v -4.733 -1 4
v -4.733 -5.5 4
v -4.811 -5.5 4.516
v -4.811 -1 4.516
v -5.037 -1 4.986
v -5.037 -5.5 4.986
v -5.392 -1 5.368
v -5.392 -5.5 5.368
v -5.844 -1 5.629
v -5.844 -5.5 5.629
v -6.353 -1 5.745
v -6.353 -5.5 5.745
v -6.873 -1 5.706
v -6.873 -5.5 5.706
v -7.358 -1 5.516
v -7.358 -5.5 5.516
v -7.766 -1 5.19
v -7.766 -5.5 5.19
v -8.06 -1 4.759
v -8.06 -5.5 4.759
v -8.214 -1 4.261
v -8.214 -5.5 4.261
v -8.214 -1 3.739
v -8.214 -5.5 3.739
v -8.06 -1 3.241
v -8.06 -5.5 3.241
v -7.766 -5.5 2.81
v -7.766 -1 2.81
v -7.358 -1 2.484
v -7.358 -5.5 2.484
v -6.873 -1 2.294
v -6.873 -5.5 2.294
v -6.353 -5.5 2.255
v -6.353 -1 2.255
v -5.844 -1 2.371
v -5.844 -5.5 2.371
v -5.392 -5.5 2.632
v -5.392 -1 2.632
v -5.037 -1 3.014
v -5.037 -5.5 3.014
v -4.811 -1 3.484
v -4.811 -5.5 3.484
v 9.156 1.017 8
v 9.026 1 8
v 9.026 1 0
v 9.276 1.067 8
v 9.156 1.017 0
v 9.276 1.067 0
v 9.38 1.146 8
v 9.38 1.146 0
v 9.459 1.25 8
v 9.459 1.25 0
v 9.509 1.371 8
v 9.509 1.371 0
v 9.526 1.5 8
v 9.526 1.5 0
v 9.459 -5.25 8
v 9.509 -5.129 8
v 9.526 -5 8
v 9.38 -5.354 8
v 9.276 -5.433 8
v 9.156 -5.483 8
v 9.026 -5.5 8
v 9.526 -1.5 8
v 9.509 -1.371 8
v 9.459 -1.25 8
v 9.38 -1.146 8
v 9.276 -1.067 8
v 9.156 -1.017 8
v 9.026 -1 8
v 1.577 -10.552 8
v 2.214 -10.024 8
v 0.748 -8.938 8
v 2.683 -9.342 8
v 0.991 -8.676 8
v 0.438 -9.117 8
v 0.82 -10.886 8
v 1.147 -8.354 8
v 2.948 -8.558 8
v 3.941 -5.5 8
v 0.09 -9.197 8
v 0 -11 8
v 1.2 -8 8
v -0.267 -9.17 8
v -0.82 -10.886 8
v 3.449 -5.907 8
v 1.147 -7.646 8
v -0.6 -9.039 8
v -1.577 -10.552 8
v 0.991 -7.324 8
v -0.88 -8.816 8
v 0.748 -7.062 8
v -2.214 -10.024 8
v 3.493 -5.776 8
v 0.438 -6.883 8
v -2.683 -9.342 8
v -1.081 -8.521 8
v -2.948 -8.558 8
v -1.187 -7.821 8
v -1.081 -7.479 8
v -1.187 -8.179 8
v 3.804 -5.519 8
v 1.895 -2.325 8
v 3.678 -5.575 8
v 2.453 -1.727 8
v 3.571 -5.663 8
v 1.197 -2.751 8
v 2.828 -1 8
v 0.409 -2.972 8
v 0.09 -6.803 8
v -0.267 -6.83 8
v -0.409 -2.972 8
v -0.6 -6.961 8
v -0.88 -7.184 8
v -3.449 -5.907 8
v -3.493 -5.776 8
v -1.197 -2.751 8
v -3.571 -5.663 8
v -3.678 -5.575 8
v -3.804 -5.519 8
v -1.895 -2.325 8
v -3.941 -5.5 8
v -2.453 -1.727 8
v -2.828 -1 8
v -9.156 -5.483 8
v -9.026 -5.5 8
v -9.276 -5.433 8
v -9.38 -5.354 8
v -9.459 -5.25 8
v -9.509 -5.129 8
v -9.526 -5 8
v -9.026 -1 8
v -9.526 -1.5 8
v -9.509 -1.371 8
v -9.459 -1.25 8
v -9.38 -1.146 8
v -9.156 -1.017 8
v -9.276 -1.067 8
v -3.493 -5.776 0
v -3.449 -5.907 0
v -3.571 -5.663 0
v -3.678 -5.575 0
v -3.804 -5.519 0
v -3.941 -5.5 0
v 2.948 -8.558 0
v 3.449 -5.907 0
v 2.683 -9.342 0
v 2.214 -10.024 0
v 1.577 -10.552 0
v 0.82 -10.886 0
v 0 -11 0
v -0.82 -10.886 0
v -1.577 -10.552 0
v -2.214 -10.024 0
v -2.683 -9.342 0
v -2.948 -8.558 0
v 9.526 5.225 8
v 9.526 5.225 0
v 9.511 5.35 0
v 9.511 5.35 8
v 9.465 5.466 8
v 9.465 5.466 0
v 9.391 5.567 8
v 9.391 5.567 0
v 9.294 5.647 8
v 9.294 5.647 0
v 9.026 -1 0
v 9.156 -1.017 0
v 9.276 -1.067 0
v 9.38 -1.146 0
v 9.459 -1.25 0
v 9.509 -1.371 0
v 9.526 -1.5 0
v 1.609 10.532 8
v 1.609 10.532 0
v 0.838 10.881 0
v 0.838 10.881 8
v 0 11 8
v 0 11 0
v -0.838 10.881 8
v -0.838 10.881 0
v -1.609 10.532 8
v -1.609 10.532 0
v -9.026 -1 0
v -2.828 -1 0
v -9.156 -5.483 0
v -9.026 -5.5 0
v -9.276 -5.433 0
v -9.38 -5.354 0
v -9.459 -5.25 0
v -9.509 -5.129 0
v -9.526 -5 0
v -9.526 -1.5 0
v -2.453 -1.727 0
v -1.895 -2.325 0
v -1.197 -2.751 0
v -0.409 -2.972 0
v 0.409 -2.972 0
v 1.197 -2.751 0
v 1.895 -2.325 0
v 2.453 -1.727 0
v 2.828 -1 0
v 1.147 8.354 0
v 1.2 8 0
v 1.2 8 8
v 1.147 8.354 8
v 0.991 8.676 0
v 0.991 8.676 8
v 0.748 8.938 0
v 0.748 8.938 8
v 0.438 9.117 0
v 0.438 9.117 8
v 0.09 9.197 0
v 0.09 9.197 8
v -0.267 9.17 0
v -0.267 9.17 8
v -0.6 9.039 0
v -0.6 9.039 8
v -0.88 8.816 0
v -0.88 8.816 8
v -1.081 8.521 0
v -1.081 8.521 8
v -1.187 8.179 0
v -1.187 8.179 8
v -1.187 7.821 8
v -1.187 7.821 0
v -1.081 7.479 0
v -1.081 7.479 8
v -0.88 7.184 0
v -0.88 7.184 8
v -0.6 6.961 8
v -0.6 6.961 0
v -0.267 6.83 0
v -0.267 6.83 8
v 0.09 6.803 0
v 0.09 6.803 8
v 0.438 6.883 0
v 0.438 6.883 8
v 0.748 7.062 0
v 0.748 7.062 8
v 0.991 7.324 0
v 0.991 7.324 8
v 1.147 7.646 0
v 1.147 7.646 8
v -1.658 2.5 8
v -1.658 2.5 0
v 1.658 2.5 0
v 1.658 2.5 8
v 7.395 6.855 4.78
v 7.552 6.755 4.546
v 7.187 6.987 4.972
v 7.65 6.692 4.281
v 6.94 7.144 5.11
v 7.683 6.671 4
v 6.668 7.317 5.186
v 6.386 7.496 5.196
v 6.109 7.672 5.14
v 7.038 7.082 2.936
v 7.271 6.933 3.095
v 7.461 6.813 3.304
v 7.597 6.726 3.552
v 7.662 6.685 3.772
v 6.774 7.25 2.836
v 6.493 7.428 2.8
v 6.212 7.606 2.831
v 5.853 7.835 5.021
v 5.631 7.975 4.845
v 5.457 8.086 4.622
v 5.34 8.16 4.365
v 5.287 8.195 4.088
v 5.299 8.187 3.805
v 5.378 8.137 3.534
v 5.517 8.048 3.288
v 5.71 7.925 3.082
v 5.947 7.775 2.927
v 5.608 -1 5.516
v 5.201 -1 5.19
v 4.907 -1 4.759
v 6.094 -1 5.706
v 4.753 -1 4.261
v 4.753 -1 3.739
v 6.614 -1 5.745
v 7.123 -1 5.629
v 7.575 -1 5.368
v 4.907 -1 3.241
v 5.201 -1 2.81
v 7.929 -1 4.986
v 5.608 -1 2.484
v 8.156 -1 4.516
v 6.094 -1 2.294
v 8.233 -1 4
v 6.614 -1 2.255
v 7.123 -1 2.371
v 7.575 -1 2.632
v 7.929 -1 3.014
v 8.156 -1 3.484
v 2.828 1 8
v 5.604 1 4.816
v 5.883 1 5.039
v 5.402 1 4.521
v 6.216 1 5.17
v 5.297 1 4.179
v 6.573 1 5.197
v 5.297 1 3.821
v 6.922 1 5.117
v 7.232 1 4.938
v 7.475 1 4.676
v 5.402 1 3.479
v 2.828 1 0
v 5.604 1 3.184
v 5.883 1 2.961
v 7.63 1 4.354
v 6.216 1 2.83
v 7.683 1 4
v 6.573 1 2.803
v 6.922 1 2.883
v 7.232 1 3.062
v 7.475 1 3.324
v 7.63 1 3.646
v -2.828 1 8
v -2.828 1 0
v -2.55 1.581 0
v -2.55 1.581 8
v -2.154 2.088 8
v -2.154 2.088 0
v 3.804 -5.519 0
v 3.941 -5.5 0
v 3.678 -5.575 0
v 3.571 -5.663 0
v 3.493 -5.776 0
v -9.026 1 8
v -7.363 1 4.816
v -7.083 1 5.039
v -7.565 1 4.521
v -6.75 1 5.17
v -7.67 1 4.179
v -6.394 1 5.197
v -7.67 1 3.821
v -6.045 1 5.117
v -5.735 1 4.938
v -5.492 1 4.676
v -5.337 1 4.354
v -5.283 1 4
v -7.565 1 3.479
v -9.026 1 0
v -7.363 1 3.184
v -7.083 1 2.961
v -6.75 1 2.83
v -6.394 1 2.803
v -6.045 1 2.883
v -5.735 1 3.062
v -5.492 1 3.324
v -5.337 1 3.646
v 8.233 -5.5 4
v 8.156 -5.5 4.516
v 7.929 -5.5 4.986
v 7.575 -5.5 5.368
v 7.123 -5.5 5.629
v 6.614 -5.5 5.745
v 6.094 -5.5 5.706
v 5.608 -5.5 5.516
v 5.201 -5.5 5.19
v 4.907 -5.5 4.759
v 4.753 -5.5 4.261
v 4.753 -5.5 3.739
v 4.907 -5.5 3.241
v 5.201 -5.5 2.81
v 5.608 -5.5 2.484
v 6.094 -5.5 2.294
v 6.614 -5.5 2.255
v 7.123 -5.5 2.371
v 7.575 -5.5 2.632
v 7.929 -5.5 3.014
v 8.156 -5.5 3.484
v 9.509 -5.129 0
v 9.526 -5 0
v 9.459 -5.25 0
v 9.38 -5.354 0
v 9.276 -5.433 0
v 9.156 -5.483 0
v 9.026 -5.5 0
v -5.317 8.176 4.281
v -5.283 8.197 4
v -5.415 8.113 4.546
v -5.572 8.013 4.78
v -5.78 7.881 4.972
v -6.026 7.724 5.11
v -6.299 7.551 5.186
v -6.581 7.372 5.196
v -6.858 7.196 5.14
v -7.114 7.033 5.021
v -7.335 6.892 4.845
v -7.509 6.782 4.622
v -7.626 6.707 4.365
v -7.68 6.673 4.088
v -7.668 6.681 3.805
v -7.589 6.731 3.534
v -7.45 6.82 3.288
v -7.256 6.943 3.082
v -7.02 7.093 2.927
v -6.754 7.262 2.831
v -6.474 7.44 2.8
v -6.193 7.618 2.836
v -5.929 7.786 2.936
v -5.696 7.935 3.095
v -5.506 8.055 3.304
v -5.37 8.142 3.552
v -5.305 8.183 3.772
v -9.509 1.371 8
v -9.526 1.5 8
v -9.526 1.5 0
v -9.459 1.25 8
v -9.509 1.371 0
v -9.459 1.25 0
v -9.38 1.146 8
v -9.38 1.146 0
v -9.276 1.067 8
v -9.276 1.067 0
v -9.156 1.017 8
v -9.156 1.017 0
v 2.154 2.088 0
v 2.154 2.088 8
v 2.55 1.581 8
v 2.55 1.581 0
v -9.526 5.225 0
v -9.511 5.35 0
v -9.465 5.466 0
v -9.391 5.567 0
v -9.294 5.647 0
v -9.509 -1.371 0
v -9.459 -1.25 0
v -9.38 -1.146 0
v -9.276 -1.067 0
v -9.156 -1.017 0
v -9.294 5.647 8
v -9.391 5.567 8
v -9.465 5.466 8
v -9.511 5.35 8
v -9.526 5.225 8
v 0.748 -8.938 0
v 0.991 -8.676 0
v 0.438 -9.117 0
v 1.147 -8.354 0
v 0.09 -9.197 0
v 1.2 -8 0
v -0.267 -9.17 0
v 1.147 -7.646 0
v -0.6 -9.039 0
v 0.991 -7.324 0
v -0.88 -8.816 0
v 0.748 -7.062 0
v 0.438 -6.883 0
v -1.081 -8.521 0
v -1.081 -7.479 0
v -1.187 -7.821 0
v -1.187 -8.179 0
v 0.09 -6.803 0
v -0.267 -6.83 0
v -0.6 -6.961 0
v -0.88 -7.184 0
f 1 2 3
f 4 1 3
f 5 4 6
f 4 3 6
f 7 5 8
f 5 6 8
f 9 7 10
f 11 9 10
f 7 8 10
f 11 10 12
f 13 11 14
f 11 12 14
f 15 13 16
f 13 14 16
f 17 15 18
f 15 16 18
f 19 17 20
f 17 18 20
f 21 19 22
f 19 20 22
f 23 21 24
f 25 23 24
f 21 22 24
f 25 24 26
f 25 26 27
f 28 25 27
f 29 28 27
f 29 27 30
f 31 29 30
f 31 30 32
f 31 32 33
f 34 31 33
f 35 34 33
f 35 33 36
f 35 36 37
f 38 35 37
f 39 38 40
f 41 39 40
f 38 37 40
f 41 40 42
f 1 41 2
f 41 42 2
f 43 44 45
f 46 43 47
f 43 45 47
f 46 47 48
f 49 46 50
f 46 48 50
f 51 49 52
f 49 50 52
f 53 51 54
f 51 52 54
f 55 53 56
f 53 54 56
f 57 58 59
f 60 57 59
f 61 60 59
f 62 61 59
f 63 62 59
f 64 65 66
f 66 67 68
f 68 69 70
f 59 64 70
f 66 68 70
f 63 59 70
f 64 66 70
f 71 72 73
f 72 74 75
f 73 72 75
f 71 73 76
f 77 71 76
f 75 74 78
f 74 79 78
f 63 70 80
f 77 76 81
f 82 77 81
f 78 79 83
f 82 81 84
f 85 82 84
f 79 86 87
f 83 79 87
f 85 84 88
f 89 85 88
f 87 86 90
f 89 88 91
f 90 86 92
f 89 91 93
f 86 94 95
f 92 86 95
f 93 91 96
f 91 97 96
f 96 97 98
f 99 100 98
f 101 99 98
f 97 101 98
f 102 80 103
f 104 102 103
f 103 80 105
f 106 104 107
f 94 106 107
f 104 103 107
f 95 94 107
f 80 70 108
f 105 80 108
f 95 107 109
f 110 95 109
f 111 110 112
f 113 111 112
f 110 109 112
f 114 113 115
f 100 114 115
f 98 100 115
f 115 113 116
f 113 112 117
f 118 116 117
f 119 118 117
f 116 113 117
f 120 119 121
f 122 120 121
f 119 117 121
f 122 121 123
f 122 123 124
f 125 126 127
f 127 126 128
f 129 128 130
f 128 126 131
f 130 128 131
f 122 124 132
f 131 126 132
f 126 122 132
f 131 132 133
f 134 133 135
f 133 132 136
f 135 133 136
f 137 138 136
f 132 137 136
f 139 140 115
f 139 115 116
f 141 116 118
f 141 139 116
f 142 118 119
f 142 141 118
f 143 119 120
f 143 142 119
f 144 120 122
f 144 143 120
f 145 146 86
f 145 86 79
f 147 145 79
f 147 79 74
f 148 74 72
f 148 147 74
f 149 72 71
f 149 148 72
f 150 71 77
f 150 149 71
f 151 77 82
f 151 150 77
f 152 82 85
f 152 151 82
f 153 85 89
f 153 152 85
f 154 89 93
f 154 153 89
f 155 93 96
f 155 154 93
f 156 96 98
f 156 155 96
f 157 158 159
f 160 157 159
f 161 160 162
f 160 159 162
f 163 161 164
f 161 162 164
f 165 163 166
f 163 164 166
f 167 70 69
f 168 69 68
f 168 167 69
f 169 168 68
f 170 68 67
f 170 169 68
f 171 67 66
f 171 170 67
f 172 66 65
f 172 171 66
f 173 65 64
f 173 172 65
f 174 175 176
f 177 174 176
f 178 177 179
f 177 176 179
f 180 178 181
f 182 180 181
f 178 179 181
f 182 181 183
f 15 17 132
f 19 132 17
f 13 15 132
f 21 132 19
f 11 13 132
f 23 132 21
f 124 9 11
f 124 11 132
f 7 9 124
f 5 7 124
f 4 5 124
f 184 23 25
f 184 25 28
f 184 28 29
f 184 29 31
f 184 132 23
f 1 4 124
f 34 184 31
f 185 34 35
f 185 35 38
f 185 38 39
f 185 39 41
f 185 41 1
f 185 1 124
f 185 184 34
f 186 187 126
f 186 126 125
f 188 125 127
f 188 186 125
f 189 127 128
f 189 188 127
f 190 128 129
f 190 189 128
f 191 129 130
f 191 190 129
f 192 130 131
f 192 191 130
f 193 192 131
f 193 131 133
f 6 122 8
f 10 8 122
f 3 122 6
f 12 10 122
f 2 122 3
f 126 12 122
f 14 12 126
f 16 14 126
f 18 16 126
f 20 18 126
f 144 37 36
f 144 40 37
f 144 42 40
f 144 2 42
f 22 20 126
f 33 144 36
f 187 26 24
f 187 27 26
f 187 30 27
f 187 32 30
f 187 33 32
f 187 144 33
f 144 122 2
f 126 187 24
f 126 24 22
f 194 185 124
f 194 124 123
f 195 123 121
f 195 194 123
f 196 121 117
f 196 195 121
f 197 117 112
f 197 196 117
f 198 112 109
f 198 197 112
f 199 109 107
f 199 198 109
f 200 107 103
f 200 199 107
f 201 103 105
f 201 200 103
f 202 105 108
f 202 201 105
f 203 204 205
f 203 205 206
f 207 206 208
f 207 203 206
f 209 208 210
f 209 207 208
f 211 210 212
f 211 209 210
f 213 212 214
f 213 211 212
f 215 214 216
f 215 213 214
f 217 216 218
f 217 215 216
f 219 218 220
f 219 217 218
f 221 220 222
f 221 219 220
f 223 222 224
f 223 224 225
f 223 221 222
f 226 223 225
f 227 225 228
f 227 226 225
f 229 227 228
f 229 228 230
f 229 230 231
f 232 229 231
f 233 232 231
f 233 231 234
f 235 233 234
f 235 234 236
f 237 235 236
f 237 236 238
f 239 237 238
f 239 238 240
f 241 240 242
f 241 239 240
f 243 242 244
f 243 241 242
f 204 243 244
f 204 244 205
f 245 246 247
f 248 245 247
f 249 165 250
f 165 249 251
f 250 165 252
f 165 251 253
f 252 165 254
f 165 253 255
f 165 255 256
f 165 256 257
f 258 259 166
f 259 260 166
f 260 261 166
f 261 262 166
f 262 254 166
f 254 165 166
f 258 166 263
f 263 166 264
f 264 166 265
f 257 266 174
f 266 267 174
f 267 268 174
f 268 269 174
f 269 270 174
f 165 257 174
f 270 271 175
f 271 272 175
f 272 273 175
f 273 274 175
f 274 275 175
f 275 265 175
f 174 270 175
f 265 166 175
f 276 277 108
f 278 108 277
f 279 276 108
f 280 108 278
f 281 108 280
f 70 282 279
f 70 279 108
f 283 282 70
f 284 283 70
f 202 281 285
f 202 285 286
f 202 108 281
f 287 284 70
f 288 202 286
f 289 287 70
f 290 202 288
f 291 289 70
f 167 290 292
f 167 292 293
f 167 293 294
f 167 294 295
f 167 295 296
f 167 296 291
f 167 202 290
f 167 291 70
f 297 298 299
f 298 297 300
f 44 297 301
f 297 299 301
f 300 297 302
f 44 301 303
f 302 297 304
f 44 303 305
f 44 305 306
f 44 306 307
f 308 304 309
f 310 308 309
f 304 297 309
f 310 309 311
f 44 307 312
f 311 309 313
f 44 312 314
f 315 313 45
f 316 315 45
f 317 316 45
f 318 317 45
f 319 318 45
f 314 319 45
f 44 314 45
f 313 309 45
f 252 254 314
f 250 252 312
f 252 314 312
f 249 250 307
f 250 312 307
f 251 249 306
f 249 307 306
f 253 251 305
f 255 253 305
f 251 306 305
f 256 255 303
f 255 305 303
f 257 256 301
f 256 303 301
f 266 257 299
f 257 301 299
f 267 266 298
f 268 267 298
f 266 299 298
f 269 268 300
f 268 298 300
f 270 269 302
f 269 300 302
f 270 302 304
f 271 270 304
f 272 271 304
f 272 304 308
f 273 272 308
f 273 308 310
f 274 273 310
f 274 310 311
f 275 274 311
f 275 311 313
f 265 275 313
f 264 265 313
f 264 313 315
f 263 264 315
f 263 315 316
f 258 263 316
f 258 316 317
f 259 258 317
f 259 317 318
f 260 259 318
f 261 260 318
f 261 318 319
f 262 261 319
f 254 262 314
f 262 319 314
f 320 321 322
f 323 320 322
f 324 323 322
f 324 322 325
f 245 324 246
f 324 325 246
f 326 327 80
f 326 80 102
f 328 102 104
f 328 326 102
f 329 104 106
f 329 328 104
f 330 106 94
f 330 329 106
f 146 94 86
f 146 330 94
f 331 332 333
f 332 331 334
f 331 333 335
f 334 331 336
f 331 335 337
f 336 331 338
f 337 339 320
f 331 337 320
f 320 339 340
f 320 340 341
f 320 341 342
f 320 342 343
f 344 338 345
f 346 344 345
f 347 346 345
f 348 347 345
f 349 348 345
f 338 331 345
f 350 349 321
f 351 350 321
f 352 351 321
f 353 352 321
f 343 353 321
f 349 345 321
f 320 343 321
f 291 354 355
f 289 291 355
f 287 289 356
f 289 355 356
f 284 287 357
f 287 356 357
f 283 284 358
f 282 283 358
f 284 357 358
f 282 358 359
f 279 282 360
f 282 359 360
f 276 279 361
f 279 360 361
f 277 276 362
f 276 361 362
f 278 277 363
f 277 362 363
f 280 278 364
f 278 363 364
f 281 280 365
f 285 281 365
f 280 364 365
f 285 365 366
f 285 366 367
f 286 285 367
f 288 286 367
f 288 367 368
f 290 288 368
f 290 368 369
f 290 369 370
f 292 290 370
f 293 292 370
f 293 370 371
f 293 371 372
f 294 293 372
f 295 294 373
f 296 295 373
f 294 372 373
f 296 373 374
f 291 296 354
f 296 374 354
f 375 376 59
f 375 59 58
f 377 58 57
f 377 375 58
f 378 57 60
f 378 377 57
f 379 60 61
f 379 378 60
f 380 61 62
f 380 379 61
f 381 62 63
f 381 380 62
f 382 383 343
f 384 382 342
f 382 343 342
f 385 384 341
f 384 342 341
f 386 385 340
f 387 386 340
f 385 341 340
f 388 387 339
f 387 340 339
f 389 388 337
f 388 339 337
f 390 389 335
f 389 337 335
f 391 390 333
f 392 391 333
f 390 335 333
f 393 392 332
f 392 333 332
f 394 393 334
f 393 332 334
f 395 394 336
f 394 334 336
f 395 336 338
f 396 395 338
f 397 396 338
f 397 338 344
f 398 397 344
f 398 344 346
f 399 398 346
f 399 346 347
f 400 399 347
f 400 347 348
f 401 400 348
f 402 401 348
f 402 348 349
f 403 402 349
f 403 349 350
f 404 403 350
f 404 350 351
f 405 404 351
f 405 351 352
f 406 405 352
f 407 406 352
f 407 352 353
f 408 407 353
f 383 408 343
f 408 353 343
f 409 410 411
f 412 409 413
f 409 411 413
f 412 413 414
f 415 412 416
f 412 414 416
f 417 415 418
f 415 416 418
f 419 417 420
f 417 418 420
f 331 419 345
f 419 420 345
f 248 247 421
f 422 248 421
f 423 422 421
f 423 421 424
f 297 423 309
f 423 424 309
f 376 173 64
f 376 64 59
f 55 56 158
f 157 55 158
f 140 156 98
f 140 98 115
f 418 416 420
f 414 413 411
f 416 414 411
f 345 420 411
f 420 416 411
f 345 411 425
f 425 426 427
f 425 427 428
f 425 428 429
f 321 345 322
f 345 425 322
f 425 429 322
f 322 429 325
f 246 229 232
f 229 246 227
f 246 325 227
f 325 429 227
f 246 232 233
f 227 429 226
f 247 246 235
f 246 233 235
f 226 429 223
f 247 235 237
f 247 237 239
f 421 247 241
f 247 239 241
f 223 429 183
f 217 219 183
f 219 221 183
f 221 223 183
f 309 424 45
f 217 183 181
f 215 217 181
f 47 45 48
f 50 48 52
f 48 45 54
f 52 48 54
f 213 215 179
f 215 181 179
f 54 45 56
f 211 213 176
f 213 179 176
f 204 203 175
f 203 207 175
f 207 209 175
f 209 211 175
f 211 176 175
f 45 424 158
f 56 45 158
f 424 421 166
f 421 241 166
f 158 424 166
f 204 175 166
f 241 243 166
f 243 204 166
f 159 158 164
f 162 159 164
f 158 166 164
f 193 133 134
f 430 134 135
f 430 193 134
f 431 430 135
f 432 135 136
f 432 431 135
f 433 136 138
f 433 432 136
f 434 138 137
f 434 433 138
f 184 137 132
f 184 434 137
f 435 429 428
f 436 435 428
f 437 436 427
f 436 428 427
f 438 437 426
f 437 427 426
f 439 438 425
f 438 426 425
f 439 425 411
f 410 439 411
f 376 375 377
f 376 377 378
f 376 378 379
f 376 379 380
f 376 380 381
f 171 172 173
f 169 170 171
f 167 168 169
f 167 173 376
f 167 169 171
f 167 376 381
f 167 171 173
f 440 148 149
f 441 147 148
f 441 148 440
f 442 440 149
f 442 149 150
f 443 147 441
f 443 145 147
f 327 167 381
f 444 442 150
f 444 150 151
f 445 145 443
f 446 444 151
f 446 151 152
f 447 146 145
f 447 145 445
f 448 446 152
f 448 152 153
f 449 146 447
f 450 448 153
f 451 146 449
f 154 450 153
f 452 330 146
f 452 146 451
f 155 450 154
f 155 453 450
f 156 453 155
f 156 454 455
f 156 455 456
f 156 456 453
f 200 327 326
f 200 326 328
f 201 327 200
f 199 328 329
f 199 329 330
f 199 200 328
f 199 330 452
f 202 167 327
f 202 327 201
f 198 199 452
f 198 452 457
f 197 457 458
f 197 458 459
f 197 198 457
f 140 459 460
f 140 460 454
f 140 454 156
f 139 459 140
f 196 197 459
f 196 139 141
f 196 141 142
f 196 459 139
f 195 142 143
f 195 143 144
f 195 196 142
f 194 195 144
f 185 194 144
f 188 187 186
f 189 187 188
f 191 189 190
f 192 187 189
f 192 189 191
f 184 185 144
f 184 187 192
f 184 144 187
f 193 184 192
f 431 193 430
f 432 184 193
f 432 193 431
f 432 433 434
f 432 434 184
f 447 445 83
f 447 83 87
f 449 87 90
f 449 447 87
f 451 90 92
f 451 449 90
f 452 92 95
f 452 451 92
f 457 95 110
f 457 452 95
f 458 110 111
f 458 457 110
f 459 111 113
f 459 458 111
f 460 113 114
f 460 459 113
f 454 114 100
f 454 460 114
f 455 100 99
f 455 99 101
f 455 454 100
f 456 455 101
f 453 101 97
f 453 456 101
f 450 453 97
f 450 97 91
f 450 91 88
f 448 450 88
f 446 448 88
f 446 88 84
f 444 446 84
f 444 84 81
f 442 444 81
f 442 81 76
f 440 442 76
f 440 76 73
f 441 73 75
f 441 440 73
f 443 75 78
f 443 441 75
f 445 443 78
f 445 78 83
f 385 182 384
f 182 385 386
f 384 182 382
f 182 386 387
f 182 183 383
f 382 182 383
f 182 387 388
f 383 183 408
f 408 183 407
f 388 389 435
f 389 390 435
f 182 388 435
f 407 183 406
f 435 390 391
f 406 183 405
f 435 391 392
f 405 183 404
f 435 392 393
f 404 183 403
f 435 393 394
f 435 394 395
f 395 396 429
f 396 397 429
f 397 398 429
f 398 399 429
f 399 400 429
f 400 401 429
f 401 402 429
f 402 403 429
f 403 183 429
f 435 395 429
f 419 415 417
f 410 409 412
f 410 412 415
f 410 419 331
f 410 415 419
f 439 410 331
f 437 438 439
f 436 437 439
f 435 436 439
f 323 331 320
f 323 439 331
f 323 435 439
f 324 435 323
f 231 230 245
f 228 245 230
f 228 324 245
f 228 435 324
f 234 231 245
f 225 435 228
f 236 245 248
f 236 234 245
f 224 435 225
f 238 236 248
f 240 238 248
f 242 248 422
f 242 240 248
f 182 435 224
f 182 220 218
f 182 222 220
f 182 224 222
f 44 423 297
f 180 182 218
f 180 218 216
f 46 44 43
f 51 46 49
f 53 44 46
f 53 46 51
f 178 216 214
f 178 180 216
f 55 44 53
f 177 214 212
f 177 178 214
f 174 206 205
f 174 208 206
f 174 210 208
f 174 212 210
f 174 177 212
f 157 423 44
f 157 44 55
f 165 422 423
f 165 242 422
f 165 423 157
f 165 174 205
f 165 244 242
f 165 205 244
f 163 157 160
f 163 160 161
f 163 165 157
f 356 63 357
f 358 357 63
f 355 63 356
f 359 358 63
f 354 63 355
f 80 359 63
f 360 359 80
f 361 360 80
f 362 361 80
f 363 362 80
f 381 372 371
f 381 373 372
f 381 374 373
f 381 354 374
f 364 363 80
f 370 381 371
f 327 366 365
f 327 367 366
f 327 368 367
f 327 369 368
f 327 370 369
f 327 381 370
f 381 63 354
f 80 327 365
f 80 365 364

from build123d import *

# Parameters (mm, degrees)
SKETCH_1_R          = 1.2
EXTRUDE_1_DEPTH     = 8
EXTRUDE_1_2_DEPTH   = 8
SKETCH_2_R          = 1.2
CUT_EXTRUDE_1_DEPTH = 17.5
SKETCH_3_R          = 1.75
CUT_EXTRUDE_2_DEPTH = 4.5


with BuildPart() as part:
    # 草图1 → 凸台-拉伸1 (new body)
    with BuildSketch(Plane.XY):
        with BuildLine():
            Line((-1.658312395, 2.5), (1.658312395, 2.5))
            ThreePointArc((1.658312395, 2.5), (2.365419176, 1.84520788), (2.828427125, 1))
            Line((2.828427125, 1), (9.026279442, 1))
            ThreePointArc((9.026279442, 1), (9.379832832, 1.146446609), (9.526279442, 1.5))
            Line((9.526279442, 1.5), (9.526279442, 5.225344163))
            ThreePointArc((9.526279442, 5.225344163), (9.464514711, 5.466071912), (9.294480045, 5.647325722))
            Line((9.294480045, 5.647325722), (1.609203622, 10.531889354))
            ThreePointArc((1.609203622, 10.531889354), (0, 11), (-1.609203622, 10.531889354))
            Line((-1.609203622, 10.531889354), (-9.294480045, 5.647325722))
            ThreePointArc((-9.294480045, 5.647325722), (-9.464514711, 5.466071912), (-9.526279442, 5.225344163))
            Line((-9.526279442, 5.225344163), (-9.526279442, 1.5))
            ThreePointArc((-9.526279442, 1.5), (-9.379832832, 1.146446609), (-9.026279442, 1))
            Line((-9.026279442, 1), (-2.828427125, 1))
            ThreePointArc((-2.828427125, 1), (-2.365419176, 1.84520788), (-1.658312395, 2.5))
        make_face()
        with Locations((0, 8)):
            Circle(SKETCH_1_R, mode=Mode.SUBTRACT)
    extrude(amount=EXTRUDE_1_DEPTH)


with BuildPart() as body_2:
    # 草图1 → Extrude 1 2 (new body)
    with BuildSketch(Plane.XY):
        with BuildLine():
            Line((-9.026279442, -1), (-2.828427125, -1))
            ThreePointArc((-2.828427125, -1), (0, -3), (2.828427125, -1))
            Line((2.828427125, -1), (9.026279442, -1))
            ThreePointArc((9.026279442, -1), (9.379832832, -1.146446609), (9.526279442, -1.5))
            Line((9.526279442, -1.5), (9.526279442, -5))
            ThreePointArc((9.526279442, -5), (9.379832832, -5.353553391), (9.026279442, -5.5))
            Line((9.026279442, -5.5), (3.940542383, -5.5))
            ThreePointArc((3.940542383, -5.5), (3.621543848, -5.614980604), (3.449259891, -5.90704026))
            Line((3.449259891, -5.90704026), (2.94769495, -8.557758442))
            ThreePointArc((2.94769495, -8.557758442), (0, -11), (-2.94769495, -8.557758442))
            Line((-2.94769495, -8.557758442), (-3.449259891, -5.90704026))
            ThreePointArc((-3.449259891, -5.90704026), (-3.621543848, -5.614980604), (-3.940542383, -5.5))
            Line((-3.940542383, -5.5), (-9.026279442, -5.5))
            ThreePointArc((-9.026279442, -5.5), (-9.379832832, -5.353553391), (-9.526279442, -5))
            Line((-9.526279442, -5), (-9.526279442, -1.5))
            ThreePointArc((-9.526279442, -1.5), (-9.379832832, -1.146446609), (-9.026279442, -1))
        make_face()
        with Locations((0, -8)):
            Circle(SKETCH_1_R, mode=Mode.SUBTRACT)
    extrude(amount=EXTRUDE_1_2_DEPTH)


with BuildPart() as cut_extrude_1_tool:
    # 草图2 → 切除-拉伸1 (new body, through all)
    with BuildSketch(Plane.XZ.offset(5.5)):
        with Locations((6.483410912, 4)):
            Circle(SKETCH_2_R)
        with Locations((-6.483410912, 4)):
            Circle(SKETCH_2_R)
    extrude(amount=-CUT_EXTRUDE_1_DEPTH)


with BuildPart() as part_1:
    add(part.part)

    # 切除-拉伸1: cut by cut_extrude_1_tool
    add(cut_extrude_1_tool.part, mode=Mode.SUBTRACT)


with BuildPart() as body_2_1:
    add(body_2.part)

    # 切除-拉伸1: cut by cut_extrude_1_tool
    add(cut_extrude_1_tool.part, mode=Mode.SUBTRACT)

    # 草图3 → 切除-拉伸2 (cut)
    with BuildSketch(Plane.XZ.offset(5.5)):
        with Locations((-6.483410912, 4)):
            Circle(SKETCH_3_R)
        with Locations((6.483410912, 4)):
            Circle(SKETCH_3_R)
    extrude(amount=-CUT_EXTRUDE_2_DEPTH, mode=Mode.SUBTRACT)


solid = Compound([part_1.part, body_2_1.part])
